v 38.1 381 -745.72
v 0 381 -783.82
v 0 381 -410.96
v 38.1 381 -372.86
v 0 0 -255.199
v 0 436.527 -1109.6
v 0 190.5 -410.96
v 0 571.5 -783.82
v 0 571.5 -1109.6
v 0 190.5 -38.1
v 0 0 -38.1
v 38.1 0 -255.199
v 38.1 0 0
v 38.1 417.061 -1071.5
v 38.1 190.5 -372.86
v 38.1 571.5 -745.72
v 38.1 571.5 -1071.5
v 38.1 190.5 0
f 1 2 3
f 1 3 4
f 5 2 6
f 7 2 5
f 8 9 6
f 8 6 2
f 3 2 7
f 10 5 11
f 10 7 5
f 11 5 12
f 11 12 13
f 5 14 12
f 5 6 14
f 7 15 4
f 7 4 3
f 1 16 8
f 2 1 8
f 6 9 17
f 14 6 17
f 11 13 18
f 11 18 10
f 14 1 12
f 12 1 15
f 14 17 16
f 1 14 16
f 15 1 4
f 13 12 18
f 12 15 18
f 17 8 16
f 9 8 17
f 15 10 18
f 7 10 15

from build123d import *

# Parameters (mm, degrees)
BOSS_EXTRUDE2_DEPTH = 38.1
CUT_EXTRUDE2_REACH  = 573.5
CUT_EXTRUDE3_DEPTH  = 190.5
CUT_EXTRUDE4_DEPTH  = 190.5
CUT_EXTRUDE5_DEPTH  = 190.5


with BuildPart() as part:
    # Sketch1 → Boss-Extrude2 (new body)
    with BuildSketch(Plane(origin=(0, 0, 0), x_dir=(0, 0, -1), z_dir=(1, 0, 0))):
        Polygon((0, 0), (0, 190.5), (372.860234147, 190.5), (372.860234147, 381), (745.720468294, 381), (745.720468294, 571.5), (1109.600446319, 571.5), (1109.600446319, 436.526629402), (255.199284902, 0), align=None)
    extrude(amount=BOSS_EXTRUDE2_DEPTH)

    # Cut-Extrude2: up to this face of the body (flat: up to its plane)
    cut_extrude2_end = Plane(part.part.faces().sort_by_distance((19.05, 218.263314701, -682.399865611))[0])
    # Sketch2 → Cut-Extrude2 (cut, up to the picked face)
    with BuildSketch(Plane(origin=(0, 571.5, 0), x_dir=(1, 0, 0), z_dir=(0, 1, 0)), mode=Mode.PRIVATE) as cut_extrude2_sk1:
        Polygon((38.1, 1109.600446319), (0, 1109.600446319), (38.1, 1071.500446319), align=None)
    cut_extrude2_tool1 = split(extrude(cut_extrude2_sk1.sketch, amount=-CUT_EXTRUDE2_REACH, mode=Mode.PRIVATE), bisect_by=cut_extrude2_end, keep=Keep.BOTH, mode=Mode.PRIVATE)
    add(cut_extrude2_tool1.solids().sort_by_distance((25.4, 571.5, -1096.900446))[0], mode=Mode.SUBTRACT)

    # Sketch2_3 → Cut-Extrude3 (cut)
    with BuildSketch(Plane(origin=(0, 571.5, 0), x_dir=(1, 0, 0), z_dir=(0, 1, 0))):
        Polygon((38.1, 745.720468294), (0, 783.820468294), (0, 745.720468294), align=None)
    extrude(amount=-CUT_EXTRUDE3_DEPTH, mode=Mode.SUBTRACT)

    # Sketch3 → Cut-Extrude4 (cut)
    with BuildSketch(Plane(origin=(0, 381, 0), x_dir=(1, 0, 0), z_dir=(0, 1, 0))):
        Polygon((38.1, 372.860234147), (0, 410.960234147), (0, 372.860234147), align=None)
    extrude(amount=-CUT_EXTRUDE4_DEPTH, mode=Mode.SUBTRACT)

    # Sketch4 → Cut-Extrude5 (cut)
    with BuildSketch(Plane(origin=(0, 190.5, 0), x_dir=(1, 0, 0), z_dir=(0, 1, 0))):
        Polygon((38.1, 0), (0, 38.1), (0, 0), align=None)
    extrude(amount=-CUT_EXTRUDE5_DEPTH, mode=Mode.SUBTRACT)


solid = part.part
